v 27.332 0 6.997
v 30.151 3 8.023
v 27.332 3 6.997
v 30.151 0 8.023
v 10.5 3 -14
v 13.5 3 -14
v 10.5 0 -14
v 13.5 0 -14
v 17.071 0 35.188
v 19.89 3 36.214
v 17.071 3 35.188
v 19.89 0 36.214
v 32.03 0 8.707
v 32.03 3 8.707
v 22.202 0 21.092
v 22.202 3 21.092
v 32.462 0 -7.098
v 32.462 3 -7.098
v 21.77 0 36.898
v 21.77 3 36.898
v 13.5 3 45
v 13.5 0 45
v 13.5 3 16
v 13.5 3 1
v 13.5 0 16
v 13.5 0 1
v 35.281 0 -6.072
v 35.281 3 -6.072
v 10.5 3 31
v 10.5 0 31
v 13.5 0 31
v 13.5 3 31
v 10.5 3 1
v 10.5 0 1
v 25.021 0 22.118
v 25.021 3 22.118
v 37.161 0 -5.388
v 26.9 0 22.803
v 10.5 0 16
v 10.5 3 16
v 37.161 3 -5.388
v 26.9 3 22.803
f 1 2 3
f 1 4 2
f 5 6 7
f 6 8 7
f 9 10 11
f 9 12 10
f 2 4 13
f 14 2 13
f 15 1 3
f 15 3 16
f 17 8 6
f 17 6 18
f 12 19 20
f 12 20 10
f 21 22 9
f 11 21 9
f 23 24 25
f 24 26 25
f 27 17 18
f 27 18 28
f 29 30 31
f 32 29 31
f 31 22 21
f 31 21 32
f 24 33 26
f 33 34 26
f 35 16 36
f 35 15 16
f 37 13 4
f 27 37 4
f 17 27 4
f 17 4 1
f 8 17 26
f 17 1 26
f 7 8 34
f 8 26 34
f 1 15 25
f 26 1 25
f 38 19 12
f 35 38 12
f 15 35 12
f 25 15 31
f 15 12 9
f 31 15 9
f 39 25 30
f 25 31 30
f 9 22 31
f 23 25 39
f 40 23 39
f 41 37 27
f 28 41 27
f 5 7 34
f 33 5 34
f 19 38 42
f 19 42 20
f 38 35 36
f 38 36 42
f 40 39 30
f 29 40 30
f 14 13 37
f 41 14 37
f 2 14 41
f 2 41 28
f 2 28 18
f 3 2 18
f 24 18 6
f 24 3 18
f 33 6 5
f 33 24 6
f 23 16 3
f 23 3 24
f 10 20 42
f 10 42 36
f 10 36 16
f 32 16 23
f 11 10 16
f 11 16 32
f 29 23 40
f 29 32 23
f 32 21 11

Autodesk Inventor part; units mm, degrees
ref_plane "YZ Plane" through (0, 0, 0) normal (1, 0, 0) x (0, 1, 0)
ref_plane "XZ Plane" through (0, 0, 0) normal (0, 1, 0) x (-1, 0, 0)
ref_plane "XY Plane" through (0, 0, 0) normal (0, 0, 1) x (1, 0, 0)
sketch "Sketch1" plane through (0, 0, 0) normal (0, 1, 0) x (-1, 0, 0)
  line L0 (-13.5, 16) -> (-10.5, 16)
  line L1 (-22.2016, 21.0925) -> (-25.0207, 22.1185)
  line L2 (-10.5, 31) -> (-13.5, 31)
  line L3 (-10.5, 16) -> (-10.5, 31)
  line L4 (-19.8904, 36.2139) -> (-17.0713, 35.1879)
  line L5 (-13.5, 45) -> (-17.0713, 35.1879)
  line L6 (-13.5, 45) -> (-13.5, 31)
  line L7 (-13.5, -14) -> (-32.4622, -7.0983)
  line L8 (-27.3319, 6.9971) -> (-22.2016, 21.0925)
  line L9 (-22.2016, 21.0925) -> (-27.3319, 6.9971)
  line L10 (-13.5, 1) -> (-13.5, 16)
  line L11 (-13.5, 16) -> (-13.5, 1)
  line L12 (-30.151, 8.0231) -> (-27.3319, 6.9971)
  line L13 (-10.5, 1) -> (-13.5, 1)
  line L14 (-13.5, -14) -> (-10.5, -14)
  line L15 (-10.5, -14) -> (-10.5, 1)
  line L16 (-32.4622, -7.0983) -> (-35.2813, -6.0723)
  line L17 (-27.3319, 6.9971) -> (-32.0304, 8.7072)
  line L18 (-32.0304, 8.7072) -> (-37.1607, -5.3882)
  line L19 (-37.1607, -5.3882) -> (-35.2813, -6.0723)
  line L20 (-25.0207, 22.1185) -> (-26.9001, 22.8026)
  line L21 (-26.9001, 22.8026) -> (-21.7698, 36.898)
  line L22 (-21.7698, 36.898) -> (-19.8904, 36.2139)
  point P0 (0, 0)
  point P1 (0, 0)
  dimension "d0" = 3
  dimension "d1" = 15
  dimension "d2" = 15
  dimension "d3" = 15
  dimension "d4" = 15
  dimension "d5" = 15
  dimension "d6" = 15
  dimension "d7" = 2.8191
  dimension "d8" = 5
extrude "Extrusion1" add sketch "Sketch1" along normal blind 3
properties part number "do_sensor_3_3mm"
